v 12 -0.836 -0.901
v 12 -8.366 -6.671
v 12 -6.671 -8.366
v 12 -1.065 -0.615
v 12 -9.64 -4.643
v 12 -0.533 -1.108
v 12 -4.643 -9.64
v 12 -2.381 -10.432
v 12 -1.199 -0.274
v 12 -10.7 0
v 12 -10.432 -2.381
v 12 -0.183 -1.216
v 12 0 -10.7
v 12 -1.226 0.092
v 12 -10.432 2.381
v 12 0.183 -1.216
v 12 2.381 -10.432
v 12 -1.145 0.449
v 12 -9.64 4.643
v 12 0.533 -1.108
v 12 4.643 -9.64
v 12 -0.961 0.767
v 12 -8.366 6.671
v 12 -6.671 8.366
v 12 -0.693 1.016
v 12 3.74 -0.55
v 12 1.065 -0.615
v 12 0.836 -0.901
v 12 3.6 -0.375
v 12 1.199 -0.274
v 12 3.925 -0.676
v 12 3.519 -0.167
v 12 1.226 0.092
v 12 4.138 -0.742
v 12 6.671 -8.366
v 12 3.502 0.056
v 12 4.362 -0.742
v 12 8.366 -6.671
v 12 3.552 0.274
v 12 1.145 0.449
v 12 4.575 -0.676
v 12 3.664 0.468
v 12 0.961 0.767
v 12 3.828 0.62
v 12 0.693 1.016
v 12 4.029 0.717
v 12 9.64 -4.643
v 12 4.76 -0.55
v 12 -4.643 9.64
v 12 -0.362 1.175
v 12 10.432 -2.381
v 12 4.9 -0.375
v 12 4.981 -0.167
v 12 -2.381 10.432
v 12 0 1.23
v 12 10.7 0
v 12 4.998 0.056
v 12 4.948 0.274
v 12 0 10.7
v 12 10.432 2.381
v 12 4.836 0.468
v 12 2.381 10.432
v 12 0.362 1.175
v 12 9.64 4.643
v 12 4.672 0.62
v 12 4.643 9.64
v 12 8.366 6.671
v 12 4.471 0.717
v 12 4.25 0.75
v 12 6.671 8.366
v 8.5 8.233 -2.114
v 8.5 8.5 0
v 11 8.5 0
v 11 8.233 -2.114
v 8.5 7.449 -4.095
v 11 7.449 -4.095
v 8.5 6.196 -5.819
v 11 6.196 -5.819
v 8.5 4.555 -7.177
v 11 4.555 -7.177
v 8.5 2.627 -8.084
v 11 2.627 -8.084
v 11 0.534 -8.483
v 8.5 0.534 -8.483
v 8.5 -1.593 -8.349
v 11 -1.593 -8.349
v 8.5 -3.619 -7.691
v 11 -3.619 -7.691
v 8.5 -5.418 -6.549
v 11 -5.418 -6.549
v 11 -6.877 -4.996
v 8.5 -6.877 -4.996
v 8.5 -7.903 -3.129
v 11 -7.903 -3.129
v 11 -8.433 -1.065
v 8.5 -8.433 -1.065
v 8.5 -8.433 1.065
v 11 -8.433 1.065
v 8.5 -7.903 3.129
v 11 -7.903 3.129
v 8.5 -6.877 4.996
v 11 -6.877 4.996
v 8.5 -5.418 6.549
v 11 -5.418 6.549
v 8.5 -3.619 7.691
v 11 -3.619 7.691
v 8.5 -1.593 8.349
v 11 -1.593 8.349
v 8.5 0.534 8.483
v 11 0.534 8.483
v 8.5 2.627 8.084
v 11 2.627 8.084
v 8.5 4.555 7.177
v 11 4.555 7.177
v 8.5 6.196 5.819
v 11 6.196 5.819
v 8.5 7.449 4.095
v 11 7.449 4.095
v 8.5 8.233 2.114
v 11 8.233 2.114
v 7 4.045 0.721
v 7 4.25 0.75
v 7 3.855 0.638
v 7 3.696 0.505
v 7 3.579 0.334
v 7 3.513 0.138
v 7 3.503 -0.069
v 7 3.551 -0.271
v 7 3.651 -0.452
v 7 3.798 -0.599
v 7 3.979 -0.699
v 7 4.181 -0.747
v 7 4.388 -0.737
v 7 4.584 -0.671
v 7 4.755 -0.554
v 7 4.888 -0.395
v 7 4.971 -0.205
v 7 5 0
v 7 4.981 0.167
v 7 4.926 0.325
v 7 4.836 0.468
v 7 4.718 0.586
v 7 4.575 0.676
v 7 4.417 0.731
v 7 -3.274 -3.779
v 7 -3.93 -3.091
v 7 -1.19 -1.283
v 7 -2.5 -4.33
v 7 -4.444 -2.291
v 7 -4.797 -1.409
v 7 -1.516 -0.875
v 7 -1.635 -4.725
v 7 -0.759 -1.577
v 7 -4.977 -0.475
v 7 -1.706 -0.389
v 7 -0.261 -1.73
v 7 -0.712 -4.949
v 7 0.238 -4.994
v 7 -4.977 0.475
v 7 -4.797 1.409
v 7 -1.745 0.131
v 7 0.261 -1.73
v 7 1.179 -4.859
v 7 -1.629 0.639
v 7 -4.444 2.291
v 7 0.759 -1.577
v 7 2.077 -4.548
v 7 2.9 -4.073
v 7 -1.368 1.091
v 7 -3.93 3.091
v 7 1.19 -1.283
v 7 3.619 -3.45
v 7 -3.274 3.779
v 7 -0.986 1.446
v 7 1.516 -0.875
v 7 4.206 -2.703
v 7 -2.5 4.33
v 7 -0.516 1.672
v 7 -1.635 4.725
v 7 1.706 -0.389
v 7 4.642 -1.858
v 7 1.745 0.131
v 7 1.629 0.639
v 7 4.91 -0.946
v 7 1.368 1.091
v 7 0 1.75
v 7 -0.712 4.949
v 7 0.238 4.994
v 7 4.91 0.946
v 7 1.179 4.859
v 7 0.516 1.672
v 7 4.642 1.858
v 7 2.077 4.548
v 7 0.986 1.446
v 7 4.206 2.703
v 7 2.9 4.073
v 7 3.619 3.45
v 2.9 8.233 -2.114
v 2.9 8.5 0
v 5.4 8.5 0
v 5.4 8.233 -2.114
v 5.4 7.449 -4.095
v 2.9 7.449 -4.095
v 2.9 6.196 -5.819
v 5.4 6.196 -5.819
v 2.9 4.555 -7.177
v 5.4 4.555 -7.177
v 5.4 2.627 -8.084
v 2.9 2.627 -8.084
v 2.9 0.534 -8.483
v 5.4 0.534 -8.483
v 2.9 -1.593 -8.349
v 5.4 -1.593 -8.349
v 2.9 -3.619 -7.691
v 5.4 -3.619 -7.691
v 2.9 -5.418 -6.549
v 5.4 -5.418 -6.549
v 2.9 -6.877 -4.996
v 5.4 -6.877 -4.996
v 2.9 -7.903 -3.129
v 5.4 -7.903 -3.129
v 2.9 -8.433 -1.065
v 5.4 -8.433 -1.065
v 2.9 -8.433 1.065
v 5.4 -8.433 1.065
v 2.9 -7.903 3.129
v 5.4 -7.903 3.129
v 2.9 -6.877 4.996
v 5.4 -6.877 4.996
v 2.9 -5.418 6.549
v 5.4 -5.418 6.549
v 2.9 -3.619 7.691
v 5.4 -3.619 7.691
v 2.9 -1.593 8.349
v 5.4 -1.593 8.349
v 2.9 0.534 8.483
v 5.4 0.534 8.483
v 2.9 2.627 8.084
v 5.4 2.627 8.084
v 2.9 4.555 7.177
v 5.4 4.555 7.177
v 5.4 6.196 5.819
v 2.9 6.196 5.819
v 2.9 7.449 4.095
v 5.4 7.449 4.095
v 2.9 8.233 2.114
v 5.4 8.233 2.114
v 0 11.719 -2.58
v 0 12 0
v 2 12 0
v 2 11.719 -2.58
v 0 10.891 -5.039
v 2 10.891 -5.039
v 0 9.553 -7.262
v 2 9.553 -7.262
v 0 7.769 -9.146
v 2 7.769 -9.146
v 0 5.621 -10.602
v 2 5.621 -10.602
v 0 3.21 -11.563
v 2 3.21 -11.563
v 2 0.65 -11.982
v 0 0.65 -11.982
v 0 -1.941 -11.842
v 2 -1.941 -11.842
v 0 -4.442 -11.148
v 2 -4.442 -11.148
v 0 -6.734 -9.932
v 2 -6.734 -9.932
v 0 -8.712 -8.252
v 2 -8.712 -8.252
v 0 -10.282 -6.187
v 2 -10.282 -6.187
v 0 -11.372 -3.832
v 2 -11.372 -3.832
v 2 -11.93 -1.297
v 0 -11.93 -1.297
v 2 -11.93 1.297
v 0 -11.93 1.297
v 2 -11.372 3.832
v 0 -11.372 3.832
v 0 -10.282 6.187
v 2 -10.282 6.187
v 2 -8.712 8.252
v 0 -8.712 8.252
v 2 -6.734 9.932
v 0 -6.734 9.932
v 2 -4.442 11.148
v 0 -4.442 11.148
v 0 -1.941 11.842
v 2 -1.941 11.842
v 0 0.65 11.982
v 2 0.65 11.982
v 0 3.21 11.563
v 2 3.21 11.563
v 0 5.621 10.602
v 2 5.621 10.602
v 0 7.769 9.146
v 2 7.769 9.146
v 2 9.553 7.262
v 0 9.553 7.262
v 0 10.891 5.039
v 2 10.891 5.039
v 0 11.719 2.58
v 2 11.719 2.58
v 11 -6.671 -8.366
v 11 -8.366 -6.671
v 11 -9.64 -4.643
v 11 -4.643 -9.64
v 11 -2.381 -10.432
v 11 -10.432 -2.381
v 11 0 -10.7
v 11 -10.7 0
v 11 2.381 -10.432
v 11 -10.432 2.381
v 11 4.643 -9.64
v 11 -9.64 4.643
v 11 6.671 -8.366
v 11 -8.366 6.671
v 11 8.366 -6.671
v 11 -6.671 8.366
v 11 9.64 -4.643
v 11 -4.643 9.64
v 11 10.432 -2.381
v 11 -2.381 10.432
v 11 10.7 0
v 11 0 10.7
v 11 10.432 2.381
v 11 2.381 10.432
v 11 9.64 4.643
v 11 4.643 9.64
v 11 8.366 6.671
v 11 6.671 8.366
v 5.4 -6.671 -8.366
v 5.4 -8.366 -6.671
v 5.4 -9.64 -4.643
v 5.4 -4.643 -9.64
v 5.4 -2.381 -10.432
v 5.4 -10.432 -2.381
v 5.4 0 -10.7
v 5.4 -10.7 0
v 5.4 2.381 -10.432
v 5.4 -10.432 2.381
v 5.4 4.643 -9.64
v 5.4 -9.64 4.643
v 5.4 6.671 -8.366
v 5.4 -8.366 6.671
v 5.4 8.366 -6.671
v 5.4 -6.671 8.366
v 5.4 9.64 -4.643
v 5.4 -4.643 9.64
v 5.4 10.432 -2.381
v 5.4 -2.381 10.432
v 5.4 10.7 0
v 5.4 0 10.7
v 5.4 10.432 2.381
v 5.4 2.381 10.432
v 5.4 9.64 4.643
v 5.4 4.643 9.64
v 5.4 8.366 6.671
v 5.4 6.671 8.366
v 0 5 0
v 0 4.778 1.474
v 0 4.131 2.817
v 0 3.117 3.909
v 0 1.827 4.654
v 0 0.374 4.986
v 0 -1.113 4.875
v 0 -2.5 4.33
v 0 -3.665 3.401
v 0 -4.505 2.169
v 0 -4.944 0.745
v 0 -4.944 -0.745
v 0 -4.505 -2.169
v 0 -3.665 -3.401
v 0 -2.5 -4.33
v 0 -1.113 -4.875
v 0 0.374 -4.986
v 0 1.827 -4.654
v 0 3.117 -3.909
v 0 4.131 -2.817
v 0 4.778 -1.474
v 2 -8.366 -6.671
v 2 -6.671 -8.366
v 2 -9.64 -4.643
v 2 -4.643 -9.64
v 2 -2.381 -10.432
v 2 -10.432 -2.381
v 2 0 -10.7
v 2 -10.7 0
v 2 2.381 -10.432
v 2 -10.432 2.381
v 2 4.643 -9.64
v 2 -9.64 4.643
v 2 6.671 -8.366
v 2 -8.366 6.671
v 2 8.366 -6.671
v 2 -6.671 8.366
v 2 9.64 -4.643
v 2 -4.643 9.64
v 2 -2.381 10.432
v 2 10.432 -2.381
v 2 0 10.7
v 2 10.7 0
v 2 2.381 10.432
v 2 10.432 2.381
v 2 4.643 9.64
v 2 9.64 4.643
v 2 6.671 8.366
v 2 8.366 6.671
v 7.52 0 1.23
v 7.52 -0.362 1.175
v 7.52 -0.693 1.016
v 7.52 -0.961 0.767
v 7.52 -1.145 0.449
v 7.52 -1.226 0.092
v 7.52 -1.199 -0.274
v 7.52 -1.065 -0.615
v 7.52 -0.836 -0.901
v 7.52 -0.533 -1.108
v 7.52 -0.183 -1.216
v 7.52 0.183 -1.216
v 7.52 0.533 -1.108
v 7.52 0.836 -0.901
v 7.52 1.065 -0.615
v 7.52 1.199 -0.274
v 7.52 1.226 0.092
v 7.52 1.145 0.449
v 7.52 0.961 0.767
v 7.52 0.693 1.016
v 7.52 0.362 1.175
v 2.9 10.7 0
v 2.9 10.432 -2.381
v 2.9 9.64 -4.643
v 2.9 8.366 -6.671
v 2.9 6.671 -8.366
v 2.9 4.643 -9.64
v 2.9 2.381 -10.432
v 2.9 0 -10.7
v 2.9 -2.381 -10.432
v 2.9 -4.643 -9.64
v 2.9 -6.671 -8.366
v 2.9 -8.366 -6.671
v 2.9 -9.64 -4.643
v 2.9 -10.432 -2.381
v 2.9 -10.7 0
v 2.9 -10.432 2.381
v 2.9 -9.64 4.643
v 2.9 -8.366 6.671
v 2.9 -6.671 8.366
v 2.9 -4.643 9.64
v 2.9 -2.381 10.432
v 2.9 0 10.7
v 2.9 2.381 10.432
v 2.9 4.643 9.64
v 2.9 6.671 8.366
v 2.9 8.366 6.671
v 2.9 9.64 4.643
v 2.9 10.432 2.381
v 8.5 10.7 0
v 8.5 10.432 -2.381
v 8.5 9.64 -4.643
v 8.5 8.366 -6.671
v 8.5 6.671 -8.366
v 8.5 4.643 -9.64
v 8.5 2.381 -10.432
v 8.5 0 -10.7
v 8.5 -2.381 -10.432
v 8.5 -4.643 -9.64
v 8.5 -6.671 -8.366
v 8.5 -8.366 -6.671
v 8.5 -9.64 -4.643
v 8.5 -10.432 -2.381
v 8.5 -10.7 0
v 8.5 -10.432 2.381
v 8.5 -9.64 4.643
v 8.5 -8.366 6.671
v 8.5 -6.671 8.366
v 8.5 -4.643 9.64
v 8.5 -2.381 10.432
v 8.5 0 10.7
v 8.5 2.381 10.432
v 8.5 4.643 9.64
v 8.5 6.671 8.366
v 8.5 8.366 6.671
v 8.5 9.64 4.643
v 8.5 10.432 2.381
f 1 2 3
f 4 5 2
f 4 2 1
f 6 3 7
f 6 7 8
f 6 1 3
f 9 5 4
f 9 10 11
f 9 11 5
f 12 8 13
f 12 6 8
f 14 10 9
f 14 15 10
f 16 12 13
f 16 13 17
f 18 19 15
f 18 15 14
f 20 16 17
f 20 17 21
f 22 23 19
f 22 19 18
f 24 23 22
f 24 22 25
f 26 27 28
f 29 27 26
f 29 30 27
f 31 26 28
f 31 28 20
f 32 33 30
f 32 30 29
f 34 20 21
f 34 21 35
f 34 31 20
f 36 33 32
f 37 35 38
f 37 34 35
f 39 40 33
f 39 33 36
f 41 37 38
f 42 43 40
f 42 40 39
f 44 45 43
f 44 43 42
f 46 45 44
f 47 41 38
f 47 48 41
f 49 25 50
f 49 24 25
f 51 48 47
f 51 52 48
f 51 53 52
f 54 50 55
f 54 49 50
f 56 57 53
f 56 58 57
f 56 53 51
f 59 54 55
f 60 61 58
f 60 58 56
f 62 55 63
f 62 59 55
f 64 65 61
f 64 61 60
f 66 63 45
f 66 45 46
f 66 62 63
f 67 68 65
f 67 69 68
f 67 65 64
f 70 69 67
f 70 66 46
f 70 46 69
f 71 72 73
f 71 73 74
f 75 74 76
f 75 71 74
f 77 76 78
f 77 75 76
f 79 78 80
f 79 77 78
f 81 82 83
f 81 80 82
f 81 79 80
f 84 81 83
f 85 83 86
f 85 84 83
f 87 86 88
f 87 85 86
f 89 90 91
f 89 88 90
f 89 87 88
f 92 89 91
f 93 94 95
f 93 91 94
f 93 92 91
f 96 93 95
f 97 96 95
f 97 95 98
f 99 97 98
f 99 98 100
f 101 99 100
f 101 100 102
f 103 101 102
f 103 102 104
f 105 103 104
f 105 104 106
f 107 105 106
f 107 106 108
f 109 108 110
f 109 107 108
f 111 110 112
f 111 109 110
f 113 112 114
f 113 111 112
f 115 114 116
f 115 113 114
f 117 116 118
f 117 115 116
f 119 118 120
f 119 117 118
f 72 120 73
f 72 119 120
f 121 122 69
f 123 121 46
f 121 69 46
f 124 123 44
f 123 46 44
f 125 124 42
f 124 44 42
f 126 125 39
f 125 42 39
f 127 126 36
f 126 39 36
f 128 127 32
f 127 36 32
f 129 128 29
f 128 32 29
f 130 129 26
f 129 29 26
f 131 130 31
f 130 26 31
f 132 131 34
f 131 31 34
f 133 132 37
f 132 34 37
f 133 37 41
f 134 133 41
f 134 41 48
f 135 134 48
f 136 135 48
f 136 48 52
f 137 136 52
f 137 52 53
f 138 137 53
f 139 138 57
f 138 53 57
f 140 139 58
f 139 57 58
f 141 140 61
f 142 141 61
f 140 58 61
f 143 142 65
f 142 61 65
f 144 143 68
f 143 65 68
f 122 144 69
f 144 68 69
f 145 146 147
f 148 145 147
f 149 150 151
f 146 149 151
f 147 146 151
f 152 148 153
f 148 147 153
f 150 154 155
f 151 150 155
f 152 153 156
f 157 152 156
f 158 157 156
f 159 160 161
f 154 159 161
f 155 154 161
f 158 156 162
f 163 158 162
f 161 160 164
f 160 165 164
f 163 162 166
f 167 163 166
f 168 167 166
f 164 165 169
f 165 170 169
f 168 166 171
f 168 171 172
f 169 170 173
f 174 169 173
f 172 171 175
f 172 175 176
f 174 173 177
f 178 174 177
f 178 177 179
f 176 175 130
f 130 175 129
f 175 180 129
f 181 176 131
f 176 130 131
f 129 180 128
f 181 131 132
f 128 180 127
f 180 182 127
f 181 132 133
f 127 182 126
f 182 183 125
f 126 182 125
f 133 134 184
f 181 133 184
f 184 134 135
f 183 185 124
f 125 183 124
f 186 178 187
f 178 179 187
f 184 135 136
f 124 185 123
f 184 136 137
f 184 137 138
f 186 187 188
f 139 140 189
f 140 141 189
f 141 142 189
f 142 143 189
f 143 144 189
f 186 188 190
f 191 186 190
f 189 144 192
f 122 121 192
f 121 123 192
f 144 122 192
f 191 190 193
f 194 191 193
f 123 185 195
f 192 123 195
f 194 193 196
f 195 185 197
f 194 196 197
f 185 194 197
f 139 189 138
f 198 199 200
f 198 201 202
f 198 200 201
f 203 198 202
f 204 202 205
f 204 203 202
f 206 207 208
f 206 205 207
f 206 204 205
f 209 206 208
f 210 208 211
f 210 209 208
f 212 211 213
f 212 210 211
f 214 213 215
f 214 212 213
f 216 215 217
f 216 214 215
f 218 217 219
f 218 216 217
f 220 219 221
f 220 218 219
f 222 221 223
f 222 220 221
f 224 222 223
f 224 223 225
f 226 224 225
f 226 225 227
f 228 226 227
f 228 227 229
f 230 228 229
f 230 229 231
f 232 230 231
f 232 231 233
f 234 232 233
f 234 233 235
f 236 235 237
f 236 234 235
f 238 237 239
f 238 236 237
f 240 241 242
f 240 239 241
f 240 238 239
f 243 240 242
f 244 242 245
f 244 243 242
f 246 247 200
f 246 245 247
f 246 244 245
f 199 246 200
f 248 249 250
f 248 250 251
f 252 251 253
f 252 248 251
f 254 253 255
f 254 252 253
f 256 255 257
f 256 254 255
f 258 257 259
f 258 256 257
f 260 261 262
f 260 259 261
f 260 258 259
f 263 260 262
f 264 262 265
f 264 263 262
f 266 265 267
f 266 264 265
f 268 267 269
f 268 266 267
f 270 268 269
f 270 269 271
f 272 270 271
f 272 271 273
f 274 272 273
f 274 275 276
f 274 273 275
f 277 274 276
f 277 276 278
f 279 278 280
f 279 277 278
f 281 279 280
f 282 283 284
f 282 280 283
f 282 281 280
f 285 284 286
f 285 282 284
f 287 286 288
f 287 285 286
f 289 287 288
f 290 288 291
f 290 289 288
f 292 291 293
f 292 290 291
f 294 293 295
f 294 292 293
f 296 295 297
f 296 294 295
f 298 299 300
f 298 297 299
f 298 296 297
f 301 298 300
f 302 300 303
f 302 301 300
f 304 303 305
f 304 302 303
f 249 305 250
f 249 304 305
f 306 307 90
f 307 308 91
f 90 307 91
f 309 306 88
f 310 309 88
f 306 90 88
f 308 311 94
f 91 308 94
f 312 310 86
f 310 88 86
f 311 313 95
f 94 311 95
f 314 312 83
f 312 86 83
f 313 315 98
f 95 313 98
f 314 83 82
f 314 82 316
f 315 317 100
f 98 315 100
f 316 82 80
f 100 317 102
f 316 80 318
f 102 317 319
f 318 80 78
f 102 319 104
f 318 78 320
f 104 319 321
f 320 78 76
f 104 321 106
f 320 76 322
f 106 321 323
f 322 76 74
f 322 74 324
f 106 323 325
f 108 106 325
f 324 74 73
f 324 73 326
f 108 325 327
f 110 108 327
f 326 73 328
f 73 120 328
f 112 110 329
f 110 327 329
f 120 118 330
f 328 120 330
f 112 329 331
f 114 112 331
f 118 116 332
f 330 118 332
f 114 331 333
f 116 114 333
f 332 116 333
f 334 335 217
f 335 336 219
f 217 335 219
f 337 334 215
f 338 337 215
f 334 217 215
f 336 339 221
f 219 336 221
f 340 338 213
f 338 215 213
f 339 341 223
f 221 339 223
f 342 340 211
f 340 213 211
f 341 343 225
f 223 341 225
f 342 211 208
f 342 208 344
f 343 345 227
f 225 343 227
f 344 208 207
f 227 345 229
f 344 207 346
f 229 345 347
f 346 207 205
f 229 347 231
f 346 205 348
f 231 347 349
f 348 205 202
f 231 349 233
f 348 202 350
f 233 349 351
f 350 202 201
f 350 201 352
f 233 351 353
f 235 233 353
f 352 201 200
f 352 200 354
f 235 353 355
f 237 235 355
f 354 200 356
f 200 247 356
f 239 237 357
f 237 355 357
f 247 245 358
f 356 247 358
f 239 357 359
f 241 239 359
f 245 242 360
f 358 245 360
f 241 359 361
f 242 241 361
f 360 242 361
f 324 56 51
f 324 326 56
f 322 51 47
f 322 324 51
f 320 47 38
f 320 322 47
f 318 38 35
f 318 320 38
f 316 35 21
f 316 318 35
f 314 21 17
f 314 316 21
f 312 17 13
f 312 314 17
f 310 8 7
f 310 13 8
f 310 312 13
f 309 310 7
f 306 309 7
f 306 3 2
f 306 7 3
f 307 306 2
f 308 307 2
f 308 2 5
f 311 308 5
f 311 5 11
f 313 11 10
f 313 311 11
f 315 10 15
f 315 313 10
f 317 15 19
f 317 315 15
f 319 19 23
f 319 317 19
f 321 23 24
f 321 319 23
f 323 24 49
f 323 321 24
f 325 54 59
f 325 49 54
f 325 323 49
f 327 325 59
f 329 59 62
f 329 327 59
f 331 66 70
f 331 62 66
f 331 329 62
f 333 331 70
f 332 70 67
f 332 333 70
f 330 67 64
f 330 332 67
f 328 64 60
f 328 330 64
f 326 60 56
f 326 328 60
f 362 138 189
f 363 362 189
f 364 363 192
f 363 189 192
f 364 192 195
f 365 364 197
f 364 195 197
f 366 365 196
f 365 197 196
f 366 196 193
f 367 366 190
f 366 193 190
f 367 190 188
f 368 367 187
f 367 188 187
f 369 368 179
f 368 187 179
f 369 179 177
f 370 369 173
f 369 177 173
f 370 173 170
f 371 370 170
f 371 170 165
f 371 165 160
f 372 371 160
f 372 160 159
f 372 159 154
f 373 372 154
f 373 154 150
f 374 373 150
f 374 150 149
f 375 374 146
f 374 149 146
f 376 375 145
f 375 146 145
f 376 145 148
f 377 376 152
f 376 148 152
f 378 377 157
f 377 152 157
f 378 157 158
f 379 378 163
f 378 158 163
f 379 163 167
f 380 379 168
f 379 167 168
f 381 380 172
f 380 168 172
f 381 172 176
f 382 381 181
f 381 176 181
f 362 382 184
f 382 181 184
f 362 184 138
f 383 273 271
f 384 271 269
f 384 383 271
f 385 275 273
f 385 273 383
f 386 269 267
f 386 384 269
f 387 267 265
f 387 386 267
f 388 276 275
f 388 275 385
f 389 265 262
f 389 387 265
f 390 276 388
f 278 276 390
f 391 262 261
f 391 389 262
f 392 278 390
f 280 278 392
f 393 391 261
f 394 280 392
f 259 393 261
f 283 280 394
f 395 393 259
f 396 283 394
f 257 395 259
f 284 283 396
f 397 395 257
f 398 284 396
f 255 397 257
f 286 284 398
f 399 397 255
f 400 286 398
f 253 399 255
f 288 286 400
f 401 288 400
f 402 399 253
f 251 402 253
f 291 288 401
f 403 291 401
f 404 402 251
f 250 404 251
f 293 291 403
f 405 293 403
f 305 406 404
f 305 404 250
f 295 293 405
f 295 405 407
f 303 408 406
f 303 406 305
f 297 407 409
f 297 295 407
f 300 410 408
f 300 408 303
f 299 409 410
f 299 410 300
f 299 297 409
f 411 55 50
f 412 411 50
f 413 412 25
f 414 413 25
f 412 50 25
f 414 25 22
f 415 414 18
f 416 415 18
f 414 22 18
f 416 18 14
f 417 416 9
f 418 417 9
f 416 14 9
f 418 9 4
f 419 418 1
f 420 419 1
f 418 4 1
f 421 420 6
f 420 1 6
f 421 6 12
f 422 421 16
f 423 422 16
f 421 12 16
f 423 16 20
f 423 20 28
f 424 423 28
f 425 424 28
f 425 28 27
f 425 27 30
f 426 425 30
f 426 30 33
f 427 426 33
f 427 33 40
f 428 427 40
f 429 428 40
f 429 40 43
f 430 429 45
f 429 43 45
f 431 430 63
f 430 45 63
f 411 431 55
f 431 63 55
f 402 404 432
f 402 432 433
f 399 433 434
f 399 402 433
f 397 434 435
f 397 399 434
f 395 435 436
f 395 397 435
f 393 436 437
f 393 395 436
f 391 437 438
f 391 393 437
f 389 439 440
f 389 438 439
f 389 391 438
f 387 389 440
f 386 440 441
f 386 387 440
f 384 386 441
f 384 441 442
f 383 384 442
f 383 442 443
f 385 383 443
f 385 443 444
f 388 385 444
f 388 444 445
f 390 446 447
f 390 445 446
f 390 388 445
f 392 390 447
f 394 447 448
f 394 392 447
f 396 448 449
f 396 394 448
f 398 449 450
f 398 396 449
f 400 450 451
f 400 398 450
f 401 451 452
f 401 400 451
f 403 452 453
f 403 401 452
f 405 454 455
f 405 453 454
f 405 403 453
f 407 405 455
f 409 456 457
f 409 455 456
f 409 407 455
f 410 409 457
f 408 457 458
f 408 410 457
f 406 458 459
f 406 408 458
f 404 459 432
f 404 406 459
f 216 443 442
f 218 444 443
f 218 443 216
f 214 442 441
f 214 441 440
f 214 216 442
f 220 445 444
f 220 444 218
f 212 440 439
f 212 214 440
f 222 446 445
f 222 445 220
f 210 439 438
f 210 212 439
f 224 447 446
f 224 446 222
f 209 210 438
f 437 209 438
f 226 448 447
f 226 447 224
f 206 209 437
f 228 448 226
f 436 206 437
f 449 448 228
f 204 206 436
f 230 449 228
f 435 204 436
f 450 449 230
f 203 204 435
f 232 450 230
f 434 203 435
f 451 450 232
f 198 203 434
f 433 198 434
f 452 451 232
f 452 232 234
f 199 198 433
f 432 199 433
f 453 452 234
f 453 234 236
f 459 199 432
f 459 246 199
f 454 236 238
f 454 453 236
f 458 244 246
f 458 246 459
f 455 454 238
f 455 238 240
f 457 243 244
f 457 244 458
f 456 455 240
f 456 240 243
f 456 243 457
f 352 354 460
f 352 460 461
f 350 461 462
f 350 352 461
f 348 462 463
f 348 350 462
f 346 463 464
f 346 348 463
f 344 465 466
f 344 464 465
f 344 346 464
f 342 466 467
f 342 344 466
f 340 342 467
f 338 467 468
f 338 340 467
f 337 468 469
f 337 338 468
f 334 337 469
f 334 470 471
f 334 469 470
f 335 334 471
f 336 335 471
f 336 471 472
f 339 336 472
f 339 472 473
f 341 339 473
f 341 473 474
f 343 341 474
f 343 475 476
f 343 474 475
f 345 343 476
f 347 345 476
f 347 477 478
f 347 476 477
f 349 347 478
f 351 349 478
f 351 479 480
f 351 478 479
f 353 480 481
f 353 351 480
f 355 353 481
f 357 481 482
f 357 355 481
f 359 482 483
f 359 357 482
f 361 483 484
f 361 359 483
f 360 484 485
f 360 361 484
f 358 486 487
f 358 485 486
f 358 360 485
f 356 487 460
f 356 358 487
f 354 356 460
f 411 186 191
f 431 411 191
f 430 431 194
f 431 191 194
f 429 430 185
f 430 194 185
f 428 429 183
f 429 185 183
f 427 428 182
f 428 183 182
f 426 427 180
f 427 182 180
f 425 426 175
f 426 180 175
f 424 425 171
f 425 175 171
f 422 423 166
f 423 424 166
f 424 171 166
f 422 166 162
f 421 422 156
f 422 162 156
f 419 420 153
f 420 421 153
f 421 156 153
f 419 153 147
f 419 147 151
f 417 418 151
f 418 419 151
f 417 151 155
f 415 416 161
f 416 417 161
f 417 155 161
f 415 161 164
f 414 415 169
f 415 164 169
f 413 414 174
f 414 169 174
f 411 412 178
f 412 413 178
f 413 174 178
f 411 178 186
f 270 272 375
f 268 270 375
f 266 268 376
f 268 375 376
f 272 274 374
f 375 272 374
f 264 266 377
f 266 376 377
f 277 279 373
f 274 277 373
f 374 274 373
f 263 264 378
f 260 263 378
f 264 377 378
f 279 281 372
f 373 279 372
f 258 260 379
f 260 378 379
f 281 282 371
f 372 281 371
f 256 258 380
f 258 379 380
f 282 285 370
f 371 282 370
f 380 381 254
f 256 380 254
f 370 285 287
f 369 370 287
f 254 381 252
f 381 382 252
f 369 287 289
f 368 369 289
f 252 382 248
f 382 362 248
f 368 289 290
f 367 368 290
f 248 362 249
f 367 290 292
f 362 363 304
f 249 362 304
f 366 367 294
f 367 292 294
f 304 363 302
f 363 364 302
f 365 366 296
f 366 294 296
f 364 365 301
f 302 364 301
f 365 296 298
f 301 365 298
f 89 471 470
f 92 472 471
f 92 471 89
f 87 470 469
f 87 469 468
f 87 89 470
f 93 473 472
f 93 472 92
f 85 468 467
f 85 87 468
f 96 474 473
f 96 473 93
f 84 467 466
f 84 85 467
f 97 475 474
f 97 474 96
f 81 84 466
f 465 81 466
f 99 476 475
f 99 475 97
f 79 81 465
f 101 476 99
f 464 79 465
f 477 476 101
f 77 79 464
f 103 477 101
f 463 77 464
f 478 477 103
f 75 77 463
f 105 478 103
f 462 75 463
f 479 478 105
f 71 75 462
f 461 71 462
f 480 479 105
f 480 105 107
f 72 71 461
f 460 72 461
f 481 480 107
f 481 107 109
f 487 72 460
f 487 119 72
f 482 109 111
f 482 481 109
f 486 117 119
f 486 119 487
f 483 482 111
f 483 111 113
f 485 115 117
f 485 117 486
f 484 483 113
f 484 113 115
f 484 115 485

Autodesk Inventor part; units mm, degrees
ref_plane "YZ Plane" through (0, 0, 0) normal (1, 0, 0) x (0, 1, 0)
ref_plane "XZ Plane" through (0, 0, 0) normal (0, 1, 0) x (-1, 0, 0)
ref_plane "XY Plane" through (0, 0, 0) normal (0, 0, 1) x (1, 0, 0)
sketch "Skizze1" plane through (0, 0, 0) normal (0, 0, 1) x (1, 0, 0)
  line L0 (-2.4, 0) -> (14.4, 0) projected
  line L1 (0, -2.4) -> (0, 14.4) projected
  line L2 (0, 5) -> (7, 5)
  line L3 (7, 5) -> (7, 0)
  line L4 (7, 0) -> (12, 0)
  line L5 (12, 0) -> (12, 10.7)
  line L6 (12, 10.7) -> (11, 10.7)
  line L7 (11, 10.7) -> (11, 8.5)
  line L8 (11, 8.5) -> (8.5, 8.5)
  line L9 (8.5, 8.5) -> (8.5, 10.7)
  line L10 (8.5, 10.7) -> (5.4, 10.7)
  line L11 (5.4, 10.7) -> (5.4, 8.5)
  line L12 (5.4, 8.5) -> (2.9, 8.5)
  line L13 (2.9, 8.5) -> (2.9, 10.7)
  line L14 (2.9, 10.7) -> (2, 10.7)
  line L15 (2, 10.7) -> (2, 12)
  line L16 (2, 12) -> (0, 12)
  line L17 (0, 12) -> (0, 5)
  point P0 (0, 0)
  dimension "d0" = 24
  dimension "d1" = 10
  dimension "d2" = 17
  dimension "d3" = 21.4
  dimension "d4" = 2.5
  dimension "d5" = 2.5
  dimension "d7" = 1
  dimension "d8" = 6.6
  dimension "d9" = 12
  dimension "d11" = 10
  dimension "d12" = 7
revolve "Umdrehung1" add sketch "Skizze1" angle 360 about axis through (-10, 0, 0) along (1, 0, 0) contours L3 L2 L1 L16 L15 L14 L13 L12 L11 L10 L9 L8 L7 L6 L5 L0
sketch "Skizze2" plane through (7, 0, 0) normal (-1, 0, 0) x (0, 0, 1)
  point P0 (0, 0)
  point P1 (0, 0)
hole "Bohrung1" at (7, 0, 0) direction (1, 0, 0) diameter 2.459 end through all countersink diameter 3.5 countersink angle 90 thread size "M3x0.5" class "6H" standard "ISO Metric profile"
sketch "Skizze3" plane through (7, 0, 0) normal (-1, 0, 0) x (0, 0, 1)
  line L0 (-16.8, 0) -> (16.8, 0) projected
  line L1 (0, -16.8) -> (0, 16.8) projected
  circle A0 centre (0, 0) radius 5 projected
  point P0 (0, 4.25)
  dimension "d21" = 4.25
hole "Bohrung2" at (7, 4.25, 0) direction (1, 0, 0) diameter 1.5 end through all
properties part number "Innenflansch"
